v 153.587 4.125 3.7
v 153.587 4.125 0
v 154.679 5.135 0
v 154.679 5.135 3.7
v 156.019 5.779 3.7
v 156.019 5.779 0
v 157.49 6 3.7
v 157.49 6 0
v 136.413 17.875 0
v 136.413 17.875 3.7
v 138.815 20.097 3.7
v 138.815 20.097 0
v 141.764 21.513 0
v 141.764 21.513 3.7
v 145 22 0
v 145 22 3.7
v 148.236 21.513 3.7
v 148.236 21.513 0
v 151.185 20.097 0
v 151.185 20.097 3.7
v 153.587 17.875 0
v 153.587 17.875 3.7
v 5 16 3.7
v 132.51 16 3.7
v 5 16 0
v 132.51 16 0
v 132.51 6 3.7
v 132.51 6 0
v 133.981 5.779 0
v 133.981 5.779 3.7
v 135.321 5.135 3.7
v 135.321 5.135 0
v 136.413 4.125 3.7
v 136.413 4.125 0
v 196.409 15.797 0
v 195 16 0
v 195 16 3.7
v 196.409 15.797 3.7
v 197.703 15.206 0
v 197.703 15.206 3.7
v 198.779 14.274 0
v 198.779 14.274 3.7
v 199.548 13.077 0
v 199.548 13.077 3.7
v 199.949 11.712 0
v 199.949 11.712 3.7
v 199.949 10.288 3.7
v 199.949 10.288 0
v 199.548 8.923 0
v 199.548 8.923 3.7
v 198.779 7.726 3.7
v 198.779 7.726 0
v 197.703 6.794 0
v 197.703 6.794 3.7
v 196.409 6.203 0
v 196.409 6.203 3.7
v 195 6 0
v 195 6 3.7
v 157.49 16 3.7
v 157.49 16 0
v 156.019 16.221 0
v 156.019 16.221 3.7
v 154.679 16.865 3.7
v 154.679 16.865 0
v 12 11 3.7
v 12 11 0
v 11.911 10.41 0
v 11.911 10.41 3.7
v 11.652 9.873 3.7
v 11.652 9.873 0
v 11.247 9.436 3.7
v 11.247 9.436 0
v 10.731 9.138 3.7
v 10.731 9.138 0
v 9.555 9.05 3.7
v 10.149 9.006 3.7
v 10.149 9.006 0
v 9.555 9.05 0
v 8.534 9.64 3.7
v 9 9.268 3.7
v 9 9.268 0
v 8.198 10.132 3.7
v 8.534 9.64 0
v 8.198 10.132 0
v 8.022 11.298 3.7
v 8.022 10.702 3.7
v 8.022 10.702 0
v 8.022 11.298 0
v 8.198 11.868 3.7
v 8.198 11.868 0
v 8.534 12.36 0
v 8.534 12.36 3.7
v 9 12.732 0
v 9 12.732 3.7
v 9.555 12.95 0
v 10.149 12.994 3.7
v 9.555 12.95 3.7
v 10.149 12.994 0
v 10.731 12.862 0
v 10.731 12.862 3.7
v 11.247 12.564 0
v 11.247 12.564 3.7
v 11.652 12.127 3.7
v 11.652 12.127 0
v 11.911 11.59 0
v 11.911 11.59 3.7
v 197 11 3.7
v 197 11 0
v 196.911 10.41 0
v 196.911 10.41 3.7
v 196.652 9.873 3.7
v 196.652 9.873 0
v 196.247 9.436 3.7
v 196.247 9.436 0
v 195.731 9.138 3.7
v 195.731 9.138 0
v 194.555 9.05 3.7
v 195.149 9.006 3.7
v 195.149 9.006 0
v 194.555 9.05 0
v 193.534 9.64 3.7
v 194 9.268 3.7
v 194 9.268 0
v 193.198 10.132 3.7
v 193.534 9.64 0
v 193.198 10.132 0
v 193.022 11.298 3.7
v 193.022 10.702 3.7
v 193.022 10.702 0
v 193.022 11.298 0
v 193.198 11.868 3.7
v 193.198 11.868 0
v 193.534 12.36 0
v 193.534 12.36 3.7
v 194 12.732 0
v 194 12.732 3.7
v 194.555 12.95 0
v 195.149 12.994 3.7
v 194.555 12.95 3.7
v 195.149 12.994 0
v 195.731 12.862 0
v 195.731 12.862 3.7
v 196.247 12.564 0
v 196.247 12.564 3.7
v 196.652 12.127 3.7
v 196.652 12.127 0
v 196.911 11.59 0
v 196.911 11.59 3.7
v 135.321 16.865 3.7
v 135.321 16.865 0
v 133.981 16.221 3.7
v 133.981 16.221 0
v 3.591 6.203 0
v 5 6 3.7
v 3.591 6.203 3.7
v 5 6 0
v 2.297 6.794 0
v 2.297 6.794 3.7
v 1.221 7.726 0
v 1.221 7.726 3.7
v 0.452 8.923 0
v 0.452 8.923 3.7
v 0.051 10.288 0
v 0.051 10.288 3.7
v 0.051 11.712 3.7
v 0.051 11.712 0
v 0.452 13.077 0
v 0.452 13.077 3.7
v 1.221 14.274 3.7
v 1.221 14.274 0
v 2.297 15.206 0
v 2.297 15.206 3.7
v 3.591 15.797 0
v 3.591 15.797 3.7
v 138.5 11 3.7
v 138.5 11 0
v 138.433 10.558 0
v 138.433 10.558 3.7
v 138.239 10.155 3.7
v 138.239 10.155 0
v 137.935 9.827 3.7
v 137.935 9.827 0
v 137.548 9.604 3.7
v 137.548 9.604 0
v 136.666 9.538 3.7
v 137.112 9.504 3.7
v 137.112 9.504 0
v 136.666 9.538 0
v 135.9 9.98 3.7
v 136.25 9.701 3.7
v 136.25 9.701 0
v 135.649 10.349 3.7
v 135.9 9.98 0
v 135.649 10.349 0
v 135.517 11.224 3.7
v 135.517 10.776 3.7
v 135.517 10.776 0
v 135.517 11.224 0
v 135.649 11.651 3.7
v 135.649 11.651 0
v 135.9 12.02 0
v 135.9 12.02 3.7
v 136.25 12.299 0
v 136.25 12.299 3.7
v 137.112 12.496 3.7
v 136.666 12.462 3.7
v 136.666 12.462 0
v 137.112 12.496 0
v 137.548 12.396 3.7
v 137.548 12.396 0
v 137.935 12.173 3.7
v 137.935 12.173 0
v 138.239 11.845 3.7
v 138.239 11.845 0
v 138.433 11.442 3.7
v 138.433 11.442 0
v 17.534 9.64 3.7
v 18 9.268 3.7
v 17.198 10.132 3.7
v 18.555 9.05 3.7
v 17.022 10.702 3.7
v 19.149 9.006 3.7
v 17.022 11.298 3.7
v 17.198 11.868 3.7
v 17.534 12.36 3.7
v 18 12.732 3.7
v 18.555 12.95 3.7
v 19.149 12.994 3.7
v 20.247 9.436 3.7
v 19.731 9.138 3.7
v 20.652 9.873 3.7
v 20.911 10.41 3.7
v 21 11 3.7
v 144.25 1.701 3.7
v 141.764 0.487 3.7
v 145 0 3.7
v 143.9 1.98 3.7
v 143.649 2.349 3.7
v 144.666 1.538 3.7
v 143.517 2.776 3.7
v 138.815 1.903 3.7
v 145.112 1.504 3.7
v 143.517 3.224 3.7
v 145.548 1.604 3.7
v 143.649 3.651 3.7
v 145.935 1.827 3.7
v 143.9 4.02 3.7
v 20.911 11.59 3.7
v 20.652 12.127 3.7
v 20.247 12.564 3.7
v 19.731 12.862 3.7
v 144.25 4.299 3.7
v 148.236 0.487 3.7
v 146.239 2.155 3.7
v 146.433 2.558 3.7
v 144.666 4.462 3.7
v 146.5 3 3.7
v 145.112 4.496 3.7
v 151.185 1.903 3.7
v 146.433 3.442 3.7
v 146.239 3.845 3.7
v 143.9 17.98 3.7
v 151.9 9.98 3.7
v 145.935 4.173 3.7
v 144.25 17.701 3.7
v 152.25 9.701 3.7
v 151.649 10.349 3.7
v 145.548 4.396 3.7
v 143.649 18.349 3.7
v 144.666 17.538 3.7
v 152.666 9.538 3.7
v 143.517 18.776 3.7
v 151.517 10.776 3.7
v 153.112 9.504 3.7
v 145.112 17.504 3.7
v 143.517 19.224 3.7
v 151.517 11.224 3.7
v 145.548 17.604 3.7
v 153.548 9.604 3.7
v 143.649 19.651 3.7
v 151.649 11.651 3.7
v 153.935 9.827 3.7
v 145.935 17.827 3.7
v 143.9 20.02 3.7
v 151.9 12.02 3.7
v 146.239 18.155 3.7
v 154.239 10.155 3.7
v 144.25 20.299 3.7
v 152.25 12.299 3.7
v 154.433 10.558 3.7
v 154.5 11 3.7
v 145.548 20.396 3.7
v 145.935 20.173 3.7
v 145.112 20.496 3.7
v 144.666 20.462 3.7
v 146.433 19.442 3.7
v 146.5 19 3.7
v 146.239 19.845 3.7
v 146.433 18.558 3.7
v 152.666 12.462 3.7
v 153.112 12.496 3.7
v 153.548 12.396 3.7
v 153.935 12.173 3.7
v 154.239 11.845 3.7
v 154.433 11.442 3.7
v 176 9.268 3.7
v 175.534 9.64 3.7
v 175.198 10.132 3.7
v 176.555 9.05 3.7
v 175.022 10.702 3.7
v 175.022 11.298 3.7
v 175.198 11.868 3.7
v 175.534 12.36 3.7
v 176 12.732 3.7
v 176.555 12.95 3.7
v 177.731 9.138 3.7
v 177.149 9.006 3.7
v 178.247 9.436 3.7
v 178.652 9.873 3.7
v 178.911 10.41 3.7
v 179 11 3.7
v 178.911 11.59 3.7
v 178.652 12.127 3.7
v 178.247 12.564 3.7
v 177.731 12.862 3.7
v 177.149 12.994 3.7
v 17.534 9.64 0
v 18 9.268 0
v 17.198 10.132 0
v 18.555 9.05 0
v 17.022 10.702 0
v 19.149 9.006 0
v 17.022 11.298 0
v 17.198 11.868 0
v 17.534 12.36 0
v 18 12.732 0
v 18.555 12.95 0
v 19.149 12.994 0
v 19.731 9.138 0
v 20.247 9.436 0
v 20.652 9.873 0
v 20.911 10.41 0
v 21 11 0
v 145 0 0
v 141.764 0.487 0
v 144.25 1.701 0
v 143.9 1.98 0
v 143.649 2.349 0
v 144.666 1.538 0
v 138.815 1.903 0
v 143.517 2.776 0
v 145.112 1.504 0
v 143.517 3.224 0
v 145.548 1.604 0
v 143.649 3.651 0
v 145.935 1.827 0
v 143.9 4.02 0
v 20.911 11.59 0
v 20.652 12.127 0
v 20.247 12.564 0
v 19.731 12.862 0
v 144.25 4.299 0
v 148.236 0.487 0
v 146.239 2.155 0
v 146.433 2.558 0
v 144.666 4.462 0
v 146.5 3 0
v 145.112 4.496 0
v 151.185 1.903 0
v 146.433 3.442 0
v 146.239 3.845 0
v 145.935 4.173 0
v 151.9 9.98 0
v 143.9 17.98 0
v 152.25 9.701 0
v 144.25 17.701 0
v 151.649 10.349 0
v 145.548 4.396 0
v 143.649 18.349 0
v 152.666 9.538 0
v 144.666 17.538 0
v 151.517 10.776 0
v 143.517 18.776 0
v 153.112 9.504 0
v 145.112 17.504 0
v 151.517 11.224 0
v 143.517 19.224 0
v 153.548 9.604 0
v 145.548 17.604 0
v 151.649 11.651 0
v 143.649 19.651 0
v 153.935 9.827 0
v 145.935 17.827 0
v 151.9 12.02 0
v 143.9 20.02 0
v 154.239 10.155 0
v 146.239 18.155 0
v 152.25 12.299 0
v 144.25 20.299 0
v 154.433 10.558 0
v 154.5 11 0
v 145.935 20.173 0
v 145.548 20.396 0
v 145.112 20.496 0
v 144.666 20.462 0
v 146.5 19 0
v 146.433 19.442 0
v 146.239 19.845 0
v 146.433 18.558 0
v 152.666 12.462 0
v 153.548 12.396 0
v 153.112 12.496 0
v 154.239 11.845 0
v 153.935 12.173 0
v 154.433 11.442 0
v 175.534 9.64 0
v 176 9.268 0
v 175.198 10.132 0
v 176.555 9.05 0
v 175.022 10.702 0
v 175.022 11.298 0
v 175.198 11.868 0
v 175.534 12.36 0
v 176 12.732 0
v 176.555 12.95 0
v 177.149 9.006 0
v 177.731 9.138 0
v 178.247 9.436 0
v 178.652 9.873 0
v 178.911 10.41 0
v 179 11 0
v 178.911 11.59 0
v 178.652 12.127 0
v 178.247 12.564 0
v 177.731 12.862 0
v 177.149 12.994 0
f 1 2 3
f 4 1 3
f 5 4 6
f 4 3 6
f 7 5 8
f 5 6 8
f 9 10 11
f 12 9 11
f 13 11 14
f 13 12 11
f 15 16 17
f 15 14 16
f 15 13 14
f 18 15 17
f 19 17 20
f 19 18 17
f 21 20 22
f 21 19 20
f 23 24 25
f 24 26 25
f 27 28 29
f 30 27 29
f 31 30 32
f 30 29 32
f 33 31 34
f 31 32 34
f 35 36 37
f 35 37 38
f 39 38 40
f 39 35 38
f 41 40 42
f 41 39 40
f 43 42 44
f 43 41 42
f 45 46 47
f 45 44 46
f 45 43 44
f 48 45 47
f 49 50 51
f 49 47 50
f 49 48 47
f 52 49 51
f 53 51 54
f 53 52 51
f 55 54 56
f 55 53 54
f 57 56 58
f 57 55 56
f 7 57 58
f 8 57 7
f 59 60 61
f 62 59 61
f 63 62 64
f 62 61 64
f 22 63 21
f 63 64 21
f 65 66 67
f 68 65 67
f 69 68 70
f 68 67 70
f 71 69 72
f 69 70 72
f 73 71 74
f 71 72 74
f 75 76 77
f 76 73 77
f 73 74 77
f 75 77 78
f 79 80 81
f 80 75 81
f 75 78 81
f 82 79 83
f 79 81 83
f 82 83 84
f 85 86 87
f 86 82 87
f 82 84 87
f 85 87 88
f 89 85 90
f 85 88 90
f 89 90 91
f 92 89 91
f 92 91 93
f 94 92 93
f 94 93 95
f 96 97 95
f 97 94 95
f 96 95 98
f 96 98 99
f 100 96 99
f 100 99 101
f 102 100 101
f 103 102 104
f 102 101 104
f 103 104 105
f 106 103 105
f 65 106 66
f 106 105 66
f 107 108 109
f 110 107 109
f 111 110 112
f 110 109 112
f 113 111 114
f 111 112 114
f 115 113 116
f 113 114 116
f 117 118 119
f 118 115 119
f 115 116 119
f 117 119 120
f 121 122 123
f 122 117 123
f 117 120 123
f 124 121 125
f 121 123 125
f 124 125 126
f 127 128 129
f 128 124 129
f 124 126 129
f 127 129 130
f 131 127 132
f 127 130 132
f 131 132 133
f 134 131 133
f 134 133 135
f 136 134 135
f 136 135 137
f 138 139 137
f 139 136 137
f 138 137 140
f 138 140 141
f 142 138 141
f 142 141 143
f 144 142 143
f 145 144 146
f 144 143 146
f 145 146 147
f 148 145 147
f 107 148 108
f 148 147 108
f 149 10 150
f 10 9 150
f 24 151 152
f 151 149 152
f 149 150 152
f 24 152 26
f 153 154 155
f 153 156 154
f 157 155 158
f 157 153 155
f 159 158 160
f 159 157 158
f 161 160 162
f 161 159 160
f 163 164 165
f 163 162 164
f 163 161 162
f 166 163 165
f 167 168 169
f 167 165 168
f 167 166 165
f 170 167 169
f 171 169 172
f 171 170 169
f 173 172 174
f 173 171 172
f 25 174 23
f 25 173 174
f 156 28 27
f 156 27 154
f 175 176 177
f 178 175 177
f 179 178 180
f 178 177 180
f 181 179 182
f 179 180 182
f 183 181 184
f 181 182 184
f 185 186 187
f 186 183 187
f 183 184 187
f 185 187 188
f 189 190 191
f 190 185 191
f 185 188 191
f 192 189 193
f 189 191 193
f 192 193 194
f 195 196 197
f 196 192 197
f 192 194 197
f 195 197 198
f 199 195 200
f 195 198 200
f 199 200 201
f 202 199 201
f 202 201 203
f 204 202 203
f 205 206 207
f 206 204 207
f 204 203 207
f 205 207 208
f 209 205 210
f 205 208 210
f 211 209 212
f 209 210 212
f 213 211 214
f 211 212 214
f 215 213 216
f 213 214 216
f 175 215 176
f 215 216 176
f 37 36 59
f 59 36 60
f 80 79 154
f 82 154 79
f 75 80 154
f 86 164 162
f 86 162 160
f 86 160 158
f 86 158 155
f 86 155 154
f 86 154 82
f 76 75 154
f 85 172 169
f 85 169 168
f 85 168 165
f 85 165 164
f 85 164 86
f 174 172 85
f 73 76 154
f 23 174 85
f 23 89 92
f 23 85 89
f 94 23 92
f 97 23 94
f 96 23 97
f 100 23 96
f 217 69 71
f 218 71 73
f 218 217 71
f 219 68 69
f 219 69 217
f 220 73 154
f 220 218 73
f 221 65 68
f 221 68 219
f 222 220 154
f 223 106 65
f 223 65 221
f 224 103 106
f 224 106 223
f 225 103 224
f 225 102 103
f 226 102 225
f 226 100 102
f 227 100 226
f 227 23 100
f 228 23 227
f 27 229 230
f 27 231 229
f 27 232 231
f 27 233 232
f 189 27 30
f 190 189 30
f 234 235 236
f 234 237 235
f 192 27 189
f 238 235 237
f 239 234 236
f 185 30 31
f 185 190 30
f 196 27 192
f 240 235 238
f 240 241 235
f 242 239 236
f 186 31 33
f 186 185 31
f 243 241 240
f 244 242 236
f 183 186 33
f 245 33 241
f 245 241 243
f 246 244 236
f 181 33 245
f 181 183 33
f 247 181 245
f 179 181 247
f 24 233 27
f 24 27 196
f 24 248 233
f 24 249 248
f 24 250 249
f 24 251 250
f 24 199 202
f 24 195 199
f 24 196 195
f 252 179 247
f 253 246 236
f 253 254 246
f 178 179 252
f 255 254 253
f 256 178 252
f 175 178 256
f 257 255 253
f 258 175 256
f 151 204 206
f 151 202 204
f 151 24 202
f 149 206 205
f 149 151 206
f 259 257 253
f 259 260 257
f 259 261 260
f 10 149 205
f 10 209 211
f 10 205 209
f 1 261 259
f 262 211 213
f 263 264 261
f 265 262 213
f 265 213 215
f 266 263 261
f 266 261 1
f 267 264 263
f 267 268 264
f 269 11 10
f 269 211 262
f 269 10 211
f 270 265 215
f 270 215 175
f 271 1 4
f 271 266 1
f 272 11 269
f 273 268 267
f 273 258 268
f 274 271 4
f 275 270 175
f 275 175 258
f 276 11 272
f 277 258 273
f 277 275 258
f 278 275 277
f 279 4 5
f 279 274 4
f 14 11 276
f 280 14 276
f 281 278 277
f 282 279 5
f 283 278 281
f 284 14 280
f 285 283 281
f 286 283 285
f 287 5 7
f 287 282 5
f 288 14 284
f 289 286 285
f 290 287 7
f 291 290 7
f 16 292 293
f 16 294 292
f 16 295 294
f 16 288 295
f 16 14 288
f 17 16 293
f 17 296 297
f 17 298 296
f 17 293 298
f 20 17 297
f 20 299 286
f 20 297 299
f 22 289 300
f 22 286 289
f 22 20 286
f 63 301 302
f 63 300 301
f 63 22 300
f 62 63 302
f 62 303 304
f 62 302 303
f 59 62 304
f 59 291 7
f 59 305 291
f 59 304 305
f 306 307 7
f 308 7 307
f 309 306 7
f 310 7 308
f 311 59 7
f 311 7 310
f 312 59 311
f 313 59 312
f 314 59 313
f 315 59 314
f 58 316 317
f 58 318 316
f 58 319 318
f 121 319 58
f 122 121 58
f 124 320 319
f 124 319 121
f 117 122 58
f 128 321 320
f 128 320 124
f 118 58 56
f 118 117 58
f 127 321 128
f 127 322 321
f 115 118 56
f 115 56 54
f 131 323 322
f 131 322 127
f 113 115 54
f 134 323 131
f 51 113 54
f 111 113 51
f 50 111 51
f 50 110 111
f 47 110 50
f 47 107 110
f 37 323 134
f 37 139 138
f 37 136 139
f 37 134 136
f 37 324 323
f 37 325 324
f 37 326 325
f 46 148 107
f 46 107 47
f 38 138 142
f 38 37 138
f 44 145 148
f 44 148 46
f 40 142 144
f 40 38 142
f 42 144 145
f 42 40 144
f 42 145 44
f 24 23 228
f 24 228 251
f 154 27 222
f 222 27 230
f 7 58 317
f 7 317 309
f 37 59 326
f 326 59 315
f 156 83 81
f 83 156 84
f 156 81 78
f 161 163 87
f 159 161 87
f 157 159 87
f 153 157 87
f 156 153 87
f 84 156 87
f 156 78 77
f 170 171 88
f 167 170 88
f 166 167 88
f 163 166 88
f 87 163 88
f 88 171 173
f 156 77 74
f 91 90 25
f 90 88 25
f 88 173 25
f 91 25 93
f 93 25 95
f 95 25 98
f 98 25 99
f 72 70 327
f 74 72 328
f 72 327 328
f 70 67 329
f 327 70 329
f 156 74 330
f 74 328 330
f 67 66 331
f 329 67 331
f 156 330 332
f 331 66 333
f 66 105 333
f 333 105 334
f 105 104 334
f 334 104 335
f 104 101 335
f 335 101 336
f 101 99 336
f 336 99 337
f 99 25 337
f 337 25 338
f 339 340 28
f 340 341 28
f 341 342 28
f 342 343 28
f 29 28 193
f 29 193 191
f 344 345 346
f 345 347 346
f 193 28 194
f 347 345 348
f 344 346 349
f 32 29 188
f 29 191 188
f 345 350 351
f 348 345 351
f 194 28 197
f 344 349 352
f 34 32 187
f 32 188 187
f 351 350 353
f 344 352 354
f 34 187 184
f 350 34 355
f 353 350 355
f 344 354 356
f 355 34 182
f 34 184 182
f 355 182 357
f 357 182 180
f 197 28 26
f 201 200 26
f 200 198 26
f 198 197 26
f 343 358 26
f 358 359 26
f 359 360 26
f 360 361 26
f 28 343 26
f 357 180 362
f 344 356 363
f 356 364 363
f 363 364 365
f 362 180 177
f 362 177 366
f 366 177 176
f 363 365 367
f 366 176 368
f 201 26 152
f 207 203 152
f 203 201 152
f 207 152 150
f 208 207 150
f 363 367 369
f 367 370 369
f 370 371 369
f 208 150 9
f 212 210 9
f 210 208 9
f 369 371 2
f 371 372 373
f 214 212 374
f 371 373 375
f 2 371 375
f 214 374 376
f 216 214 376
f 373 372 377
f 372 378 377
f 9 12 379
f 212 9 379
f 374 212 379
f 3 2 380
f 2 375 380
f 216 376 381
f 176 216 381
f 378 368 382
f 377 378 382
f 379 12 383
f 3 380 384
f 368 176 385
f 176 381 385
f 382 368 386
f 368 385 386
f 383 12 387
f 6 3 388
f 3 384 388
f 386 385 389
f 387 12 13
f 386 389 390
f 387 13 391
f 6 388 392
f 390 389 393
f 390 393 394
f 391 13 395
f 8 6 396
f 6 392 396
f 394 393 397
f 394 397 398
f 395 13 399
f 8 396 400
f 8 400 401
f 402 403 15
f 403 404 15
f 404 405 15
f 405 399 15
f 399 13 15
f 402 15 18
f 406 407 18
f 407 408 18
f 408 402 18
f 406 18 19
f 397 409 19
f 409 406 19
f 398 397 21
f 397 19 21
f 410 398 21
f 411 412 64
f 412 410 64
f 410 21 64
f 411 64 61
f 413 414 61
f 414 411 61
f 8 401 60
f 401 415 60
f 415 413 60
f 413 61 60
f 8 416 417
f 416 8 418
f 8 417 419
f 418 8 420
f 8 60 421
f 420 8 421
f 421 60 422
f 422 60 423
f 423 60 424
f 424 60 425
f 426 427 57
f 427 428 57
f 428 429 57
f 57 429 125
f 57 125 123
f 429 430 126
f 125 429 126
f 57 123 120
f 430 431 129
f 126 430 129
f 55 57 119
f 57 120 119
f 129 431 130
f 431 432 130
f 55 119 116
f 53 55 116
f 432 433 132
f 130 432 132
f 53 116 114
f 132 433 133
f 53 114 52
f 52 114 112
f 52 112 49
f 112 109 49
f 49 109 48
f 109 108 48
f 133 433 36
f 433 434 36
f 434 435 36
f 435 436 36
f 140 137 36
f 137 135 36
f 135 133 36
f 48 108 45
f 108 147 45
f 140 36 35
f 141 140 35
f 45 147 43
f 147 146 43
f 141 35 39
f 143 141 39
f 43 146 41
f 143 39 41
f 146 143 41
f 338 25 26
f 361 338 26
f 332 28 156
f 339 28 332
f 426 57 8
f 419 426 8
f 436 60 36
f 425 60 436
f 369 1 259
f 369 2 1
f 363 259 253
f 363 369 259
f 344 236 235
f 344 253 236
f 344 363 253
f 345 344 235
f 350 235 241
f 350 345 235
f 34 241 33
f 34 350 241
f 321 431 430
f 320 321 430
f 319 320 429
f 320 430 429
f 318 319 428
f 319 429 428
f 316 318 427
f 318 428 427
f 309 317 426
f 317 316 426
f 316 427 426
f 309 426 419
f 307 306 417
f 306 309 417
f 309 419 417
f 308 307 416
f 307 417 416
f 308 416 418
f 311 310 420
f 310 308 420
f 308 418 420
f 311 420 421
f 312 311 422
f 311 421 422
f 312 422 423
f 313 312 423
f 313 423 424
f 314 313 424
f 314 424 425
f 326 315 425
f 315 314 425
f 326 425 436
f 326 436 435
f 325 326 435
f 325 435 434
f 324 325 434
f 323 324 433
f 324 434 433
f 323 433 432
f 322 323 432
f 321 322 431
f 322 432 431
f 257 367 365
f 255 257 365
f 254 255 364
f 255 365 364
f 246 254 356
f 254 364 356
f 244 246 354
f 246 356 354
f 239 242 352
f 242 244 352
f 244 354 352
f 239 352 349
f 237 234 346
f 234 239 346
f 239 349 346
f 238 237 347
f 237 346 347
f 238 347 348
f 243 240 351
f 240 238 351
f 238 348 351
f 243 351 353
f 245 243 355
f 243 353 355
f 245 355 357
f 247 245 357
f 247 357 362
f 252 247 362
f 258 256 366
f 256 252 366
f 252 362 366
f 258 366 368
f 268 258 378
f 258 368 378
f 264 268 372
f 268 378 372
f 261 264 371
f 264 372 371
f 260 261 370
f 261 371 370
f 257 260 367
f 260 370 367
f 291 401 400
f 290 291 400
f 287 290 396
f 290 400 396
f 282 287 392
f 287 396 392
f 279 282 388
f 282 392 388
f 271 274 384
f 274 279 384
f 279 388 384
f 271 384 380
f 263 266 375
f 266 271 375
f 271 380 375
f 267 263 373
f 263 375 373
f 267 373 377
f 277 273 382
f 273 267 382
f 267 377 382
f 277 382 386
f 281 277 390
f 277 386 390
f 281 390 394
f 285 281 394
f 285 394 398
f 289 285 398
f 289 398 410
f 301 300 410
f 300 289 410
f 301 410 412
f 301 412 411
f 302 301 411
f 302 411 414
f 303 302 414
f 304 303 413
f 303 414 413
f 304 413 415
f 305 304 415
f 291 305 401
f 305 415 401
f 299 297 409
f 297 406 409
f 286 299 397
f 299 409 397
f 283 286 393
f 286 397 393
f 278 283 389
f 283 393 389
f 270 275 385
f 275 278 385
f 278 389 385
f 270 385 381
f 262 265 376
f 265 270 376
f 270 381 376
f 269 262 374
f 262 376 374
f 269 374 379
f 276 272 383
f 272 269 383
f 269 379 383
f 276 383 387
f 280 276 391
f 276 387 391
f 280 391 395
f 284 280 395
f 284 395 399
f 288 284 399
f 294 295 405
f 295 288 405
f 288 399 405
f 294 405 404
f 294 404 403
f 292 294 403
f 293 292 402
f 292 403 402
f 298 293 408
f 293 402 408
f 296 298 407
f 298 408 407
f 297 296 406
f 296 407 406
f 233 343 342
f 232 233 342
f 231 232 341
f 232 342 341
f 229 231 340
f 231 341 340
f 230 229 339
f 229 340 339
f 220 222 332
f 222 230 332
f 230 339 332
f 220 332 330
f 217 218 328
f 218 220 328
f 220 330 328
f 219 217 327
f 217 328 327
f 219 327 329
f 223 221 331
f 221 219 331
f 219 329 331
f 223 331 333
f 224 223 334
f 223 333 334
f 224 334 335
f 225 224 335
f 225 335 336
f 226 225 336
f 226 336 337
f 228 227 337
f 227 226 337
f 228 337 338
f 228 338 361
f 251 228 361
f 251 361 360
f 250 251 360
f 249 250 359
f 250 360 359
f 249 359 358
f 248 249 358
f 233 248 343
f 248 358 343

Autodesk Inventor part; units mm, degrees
ref_plane "XZ Plane" through (0, 0, 0) normal (0, 1, 0) x (-1, 0, 0)
ref_plane "XY Plane" through (0, 0, 0) normal (0, 0, 1) x (1, 0, 0)
sketch "Sketch1" plane through (0, 0, 0) normal (0, 0, 1) x (1, 0, 0)
  line L0 (0, 0) -> (200, 0) construction
  line L1 (200, 0) -> (200, 22) construction
  line L2 (200, 22) -> (0, 22) construction
  line L3 (0, 22) -> (0, 0) construction
  line L4 (200, 22) -> (145, 22) construction
  line L5 (145, 22) -> (145, 0) construction
  line L6 (145, 0) -> (200, 0) construction
  line L7 (200, 0) -> (200, 22) construction
  line L8 (200, 11) -> (0, 11) construction
  arc A0 (5, 16) -> (5, 6) centre (5, 11) ccw
  circle A1 centre (10, 11) radius 2
  circle A2 centre (19, 11) radius 2
  arc A3 (195, 6) -> (195, 16) centre (195, 11) ccw
  circle A4 centre (145, 11) radius 8 construction
  circle A5 centre (145, 19) radius 1.5
  circle A6 centre (137, 11) radius 1.5
  circle A7 centre (145, 11) radius 8 construction
  circle A8 centre (145, 3) radius 1.5
  circle A9 centre (153, 11) radius 1.5
  line L9 (132.51, 16) -> (5, 16)
  line L10 (195, 16) -> (157.49, 16)
  line L11 (195, 6) -> (157.49, 6)
  line L12 (132.51, 6) -> (5, 6)
  arc A10 (136.4131, 4.125) -> (153.5869, 4.125) centre (145, 11) ccw
  arc A11 (153.5869, 17.875) -> (136.4131, 17.875) centre (145, 11) ccw
  circle A12 centre (195, 11) radius 2
  circle A13 centre (177, 11) radius 2
  arc A14 (132.51, 16) -> (136.4131, 17.875) centre (132.51, 21) ccw
  arc A15 (136.4131, 4.125) -> (132.51, 6) centre (132.51, 1) ccw
  arc A16 (153.5869, 17.875) -> (157.49, 16) centre (157.49, 21) ccw
  arc A17 (157.49, 6) -> (153.5869, 4.125) centre (157.49, 1) ccw
  point P0 (135.202, 16)
  point P1 (154.798, 6)
  point P2 (135.202, 6)
  point P3 (154.798, 16)
  dimension "d0" = 200
  dimension "d1" = 22
  dimension "d2" = 55
  dimension "d7" = 4
  dimension "d8" = 4
  dimension "d9" = 9
  dimension "d10" = 10
  dimension "d11" = 16
  dimension "d12" = 3
  dimension "d13" = 3
  dimension "d14" = 4
  dimension "d15" = 4
  dimension "d16" = 18
  dimension "d17" = 5
extrude "Extrusion1" add sketch "Sketch1" along normal blind 3.7
sketch "Sketch2" plane through (0, 0, 0) normal (1, 0, 0) x (0, 1, 0)
  point P0 (0, 0)
ref_plane "Work Plane1" through (0, 0, 0) normal (1, 0, 0) x (0, 1, 0)
properties part number "Pendulo" material "PMMA Plastic"
